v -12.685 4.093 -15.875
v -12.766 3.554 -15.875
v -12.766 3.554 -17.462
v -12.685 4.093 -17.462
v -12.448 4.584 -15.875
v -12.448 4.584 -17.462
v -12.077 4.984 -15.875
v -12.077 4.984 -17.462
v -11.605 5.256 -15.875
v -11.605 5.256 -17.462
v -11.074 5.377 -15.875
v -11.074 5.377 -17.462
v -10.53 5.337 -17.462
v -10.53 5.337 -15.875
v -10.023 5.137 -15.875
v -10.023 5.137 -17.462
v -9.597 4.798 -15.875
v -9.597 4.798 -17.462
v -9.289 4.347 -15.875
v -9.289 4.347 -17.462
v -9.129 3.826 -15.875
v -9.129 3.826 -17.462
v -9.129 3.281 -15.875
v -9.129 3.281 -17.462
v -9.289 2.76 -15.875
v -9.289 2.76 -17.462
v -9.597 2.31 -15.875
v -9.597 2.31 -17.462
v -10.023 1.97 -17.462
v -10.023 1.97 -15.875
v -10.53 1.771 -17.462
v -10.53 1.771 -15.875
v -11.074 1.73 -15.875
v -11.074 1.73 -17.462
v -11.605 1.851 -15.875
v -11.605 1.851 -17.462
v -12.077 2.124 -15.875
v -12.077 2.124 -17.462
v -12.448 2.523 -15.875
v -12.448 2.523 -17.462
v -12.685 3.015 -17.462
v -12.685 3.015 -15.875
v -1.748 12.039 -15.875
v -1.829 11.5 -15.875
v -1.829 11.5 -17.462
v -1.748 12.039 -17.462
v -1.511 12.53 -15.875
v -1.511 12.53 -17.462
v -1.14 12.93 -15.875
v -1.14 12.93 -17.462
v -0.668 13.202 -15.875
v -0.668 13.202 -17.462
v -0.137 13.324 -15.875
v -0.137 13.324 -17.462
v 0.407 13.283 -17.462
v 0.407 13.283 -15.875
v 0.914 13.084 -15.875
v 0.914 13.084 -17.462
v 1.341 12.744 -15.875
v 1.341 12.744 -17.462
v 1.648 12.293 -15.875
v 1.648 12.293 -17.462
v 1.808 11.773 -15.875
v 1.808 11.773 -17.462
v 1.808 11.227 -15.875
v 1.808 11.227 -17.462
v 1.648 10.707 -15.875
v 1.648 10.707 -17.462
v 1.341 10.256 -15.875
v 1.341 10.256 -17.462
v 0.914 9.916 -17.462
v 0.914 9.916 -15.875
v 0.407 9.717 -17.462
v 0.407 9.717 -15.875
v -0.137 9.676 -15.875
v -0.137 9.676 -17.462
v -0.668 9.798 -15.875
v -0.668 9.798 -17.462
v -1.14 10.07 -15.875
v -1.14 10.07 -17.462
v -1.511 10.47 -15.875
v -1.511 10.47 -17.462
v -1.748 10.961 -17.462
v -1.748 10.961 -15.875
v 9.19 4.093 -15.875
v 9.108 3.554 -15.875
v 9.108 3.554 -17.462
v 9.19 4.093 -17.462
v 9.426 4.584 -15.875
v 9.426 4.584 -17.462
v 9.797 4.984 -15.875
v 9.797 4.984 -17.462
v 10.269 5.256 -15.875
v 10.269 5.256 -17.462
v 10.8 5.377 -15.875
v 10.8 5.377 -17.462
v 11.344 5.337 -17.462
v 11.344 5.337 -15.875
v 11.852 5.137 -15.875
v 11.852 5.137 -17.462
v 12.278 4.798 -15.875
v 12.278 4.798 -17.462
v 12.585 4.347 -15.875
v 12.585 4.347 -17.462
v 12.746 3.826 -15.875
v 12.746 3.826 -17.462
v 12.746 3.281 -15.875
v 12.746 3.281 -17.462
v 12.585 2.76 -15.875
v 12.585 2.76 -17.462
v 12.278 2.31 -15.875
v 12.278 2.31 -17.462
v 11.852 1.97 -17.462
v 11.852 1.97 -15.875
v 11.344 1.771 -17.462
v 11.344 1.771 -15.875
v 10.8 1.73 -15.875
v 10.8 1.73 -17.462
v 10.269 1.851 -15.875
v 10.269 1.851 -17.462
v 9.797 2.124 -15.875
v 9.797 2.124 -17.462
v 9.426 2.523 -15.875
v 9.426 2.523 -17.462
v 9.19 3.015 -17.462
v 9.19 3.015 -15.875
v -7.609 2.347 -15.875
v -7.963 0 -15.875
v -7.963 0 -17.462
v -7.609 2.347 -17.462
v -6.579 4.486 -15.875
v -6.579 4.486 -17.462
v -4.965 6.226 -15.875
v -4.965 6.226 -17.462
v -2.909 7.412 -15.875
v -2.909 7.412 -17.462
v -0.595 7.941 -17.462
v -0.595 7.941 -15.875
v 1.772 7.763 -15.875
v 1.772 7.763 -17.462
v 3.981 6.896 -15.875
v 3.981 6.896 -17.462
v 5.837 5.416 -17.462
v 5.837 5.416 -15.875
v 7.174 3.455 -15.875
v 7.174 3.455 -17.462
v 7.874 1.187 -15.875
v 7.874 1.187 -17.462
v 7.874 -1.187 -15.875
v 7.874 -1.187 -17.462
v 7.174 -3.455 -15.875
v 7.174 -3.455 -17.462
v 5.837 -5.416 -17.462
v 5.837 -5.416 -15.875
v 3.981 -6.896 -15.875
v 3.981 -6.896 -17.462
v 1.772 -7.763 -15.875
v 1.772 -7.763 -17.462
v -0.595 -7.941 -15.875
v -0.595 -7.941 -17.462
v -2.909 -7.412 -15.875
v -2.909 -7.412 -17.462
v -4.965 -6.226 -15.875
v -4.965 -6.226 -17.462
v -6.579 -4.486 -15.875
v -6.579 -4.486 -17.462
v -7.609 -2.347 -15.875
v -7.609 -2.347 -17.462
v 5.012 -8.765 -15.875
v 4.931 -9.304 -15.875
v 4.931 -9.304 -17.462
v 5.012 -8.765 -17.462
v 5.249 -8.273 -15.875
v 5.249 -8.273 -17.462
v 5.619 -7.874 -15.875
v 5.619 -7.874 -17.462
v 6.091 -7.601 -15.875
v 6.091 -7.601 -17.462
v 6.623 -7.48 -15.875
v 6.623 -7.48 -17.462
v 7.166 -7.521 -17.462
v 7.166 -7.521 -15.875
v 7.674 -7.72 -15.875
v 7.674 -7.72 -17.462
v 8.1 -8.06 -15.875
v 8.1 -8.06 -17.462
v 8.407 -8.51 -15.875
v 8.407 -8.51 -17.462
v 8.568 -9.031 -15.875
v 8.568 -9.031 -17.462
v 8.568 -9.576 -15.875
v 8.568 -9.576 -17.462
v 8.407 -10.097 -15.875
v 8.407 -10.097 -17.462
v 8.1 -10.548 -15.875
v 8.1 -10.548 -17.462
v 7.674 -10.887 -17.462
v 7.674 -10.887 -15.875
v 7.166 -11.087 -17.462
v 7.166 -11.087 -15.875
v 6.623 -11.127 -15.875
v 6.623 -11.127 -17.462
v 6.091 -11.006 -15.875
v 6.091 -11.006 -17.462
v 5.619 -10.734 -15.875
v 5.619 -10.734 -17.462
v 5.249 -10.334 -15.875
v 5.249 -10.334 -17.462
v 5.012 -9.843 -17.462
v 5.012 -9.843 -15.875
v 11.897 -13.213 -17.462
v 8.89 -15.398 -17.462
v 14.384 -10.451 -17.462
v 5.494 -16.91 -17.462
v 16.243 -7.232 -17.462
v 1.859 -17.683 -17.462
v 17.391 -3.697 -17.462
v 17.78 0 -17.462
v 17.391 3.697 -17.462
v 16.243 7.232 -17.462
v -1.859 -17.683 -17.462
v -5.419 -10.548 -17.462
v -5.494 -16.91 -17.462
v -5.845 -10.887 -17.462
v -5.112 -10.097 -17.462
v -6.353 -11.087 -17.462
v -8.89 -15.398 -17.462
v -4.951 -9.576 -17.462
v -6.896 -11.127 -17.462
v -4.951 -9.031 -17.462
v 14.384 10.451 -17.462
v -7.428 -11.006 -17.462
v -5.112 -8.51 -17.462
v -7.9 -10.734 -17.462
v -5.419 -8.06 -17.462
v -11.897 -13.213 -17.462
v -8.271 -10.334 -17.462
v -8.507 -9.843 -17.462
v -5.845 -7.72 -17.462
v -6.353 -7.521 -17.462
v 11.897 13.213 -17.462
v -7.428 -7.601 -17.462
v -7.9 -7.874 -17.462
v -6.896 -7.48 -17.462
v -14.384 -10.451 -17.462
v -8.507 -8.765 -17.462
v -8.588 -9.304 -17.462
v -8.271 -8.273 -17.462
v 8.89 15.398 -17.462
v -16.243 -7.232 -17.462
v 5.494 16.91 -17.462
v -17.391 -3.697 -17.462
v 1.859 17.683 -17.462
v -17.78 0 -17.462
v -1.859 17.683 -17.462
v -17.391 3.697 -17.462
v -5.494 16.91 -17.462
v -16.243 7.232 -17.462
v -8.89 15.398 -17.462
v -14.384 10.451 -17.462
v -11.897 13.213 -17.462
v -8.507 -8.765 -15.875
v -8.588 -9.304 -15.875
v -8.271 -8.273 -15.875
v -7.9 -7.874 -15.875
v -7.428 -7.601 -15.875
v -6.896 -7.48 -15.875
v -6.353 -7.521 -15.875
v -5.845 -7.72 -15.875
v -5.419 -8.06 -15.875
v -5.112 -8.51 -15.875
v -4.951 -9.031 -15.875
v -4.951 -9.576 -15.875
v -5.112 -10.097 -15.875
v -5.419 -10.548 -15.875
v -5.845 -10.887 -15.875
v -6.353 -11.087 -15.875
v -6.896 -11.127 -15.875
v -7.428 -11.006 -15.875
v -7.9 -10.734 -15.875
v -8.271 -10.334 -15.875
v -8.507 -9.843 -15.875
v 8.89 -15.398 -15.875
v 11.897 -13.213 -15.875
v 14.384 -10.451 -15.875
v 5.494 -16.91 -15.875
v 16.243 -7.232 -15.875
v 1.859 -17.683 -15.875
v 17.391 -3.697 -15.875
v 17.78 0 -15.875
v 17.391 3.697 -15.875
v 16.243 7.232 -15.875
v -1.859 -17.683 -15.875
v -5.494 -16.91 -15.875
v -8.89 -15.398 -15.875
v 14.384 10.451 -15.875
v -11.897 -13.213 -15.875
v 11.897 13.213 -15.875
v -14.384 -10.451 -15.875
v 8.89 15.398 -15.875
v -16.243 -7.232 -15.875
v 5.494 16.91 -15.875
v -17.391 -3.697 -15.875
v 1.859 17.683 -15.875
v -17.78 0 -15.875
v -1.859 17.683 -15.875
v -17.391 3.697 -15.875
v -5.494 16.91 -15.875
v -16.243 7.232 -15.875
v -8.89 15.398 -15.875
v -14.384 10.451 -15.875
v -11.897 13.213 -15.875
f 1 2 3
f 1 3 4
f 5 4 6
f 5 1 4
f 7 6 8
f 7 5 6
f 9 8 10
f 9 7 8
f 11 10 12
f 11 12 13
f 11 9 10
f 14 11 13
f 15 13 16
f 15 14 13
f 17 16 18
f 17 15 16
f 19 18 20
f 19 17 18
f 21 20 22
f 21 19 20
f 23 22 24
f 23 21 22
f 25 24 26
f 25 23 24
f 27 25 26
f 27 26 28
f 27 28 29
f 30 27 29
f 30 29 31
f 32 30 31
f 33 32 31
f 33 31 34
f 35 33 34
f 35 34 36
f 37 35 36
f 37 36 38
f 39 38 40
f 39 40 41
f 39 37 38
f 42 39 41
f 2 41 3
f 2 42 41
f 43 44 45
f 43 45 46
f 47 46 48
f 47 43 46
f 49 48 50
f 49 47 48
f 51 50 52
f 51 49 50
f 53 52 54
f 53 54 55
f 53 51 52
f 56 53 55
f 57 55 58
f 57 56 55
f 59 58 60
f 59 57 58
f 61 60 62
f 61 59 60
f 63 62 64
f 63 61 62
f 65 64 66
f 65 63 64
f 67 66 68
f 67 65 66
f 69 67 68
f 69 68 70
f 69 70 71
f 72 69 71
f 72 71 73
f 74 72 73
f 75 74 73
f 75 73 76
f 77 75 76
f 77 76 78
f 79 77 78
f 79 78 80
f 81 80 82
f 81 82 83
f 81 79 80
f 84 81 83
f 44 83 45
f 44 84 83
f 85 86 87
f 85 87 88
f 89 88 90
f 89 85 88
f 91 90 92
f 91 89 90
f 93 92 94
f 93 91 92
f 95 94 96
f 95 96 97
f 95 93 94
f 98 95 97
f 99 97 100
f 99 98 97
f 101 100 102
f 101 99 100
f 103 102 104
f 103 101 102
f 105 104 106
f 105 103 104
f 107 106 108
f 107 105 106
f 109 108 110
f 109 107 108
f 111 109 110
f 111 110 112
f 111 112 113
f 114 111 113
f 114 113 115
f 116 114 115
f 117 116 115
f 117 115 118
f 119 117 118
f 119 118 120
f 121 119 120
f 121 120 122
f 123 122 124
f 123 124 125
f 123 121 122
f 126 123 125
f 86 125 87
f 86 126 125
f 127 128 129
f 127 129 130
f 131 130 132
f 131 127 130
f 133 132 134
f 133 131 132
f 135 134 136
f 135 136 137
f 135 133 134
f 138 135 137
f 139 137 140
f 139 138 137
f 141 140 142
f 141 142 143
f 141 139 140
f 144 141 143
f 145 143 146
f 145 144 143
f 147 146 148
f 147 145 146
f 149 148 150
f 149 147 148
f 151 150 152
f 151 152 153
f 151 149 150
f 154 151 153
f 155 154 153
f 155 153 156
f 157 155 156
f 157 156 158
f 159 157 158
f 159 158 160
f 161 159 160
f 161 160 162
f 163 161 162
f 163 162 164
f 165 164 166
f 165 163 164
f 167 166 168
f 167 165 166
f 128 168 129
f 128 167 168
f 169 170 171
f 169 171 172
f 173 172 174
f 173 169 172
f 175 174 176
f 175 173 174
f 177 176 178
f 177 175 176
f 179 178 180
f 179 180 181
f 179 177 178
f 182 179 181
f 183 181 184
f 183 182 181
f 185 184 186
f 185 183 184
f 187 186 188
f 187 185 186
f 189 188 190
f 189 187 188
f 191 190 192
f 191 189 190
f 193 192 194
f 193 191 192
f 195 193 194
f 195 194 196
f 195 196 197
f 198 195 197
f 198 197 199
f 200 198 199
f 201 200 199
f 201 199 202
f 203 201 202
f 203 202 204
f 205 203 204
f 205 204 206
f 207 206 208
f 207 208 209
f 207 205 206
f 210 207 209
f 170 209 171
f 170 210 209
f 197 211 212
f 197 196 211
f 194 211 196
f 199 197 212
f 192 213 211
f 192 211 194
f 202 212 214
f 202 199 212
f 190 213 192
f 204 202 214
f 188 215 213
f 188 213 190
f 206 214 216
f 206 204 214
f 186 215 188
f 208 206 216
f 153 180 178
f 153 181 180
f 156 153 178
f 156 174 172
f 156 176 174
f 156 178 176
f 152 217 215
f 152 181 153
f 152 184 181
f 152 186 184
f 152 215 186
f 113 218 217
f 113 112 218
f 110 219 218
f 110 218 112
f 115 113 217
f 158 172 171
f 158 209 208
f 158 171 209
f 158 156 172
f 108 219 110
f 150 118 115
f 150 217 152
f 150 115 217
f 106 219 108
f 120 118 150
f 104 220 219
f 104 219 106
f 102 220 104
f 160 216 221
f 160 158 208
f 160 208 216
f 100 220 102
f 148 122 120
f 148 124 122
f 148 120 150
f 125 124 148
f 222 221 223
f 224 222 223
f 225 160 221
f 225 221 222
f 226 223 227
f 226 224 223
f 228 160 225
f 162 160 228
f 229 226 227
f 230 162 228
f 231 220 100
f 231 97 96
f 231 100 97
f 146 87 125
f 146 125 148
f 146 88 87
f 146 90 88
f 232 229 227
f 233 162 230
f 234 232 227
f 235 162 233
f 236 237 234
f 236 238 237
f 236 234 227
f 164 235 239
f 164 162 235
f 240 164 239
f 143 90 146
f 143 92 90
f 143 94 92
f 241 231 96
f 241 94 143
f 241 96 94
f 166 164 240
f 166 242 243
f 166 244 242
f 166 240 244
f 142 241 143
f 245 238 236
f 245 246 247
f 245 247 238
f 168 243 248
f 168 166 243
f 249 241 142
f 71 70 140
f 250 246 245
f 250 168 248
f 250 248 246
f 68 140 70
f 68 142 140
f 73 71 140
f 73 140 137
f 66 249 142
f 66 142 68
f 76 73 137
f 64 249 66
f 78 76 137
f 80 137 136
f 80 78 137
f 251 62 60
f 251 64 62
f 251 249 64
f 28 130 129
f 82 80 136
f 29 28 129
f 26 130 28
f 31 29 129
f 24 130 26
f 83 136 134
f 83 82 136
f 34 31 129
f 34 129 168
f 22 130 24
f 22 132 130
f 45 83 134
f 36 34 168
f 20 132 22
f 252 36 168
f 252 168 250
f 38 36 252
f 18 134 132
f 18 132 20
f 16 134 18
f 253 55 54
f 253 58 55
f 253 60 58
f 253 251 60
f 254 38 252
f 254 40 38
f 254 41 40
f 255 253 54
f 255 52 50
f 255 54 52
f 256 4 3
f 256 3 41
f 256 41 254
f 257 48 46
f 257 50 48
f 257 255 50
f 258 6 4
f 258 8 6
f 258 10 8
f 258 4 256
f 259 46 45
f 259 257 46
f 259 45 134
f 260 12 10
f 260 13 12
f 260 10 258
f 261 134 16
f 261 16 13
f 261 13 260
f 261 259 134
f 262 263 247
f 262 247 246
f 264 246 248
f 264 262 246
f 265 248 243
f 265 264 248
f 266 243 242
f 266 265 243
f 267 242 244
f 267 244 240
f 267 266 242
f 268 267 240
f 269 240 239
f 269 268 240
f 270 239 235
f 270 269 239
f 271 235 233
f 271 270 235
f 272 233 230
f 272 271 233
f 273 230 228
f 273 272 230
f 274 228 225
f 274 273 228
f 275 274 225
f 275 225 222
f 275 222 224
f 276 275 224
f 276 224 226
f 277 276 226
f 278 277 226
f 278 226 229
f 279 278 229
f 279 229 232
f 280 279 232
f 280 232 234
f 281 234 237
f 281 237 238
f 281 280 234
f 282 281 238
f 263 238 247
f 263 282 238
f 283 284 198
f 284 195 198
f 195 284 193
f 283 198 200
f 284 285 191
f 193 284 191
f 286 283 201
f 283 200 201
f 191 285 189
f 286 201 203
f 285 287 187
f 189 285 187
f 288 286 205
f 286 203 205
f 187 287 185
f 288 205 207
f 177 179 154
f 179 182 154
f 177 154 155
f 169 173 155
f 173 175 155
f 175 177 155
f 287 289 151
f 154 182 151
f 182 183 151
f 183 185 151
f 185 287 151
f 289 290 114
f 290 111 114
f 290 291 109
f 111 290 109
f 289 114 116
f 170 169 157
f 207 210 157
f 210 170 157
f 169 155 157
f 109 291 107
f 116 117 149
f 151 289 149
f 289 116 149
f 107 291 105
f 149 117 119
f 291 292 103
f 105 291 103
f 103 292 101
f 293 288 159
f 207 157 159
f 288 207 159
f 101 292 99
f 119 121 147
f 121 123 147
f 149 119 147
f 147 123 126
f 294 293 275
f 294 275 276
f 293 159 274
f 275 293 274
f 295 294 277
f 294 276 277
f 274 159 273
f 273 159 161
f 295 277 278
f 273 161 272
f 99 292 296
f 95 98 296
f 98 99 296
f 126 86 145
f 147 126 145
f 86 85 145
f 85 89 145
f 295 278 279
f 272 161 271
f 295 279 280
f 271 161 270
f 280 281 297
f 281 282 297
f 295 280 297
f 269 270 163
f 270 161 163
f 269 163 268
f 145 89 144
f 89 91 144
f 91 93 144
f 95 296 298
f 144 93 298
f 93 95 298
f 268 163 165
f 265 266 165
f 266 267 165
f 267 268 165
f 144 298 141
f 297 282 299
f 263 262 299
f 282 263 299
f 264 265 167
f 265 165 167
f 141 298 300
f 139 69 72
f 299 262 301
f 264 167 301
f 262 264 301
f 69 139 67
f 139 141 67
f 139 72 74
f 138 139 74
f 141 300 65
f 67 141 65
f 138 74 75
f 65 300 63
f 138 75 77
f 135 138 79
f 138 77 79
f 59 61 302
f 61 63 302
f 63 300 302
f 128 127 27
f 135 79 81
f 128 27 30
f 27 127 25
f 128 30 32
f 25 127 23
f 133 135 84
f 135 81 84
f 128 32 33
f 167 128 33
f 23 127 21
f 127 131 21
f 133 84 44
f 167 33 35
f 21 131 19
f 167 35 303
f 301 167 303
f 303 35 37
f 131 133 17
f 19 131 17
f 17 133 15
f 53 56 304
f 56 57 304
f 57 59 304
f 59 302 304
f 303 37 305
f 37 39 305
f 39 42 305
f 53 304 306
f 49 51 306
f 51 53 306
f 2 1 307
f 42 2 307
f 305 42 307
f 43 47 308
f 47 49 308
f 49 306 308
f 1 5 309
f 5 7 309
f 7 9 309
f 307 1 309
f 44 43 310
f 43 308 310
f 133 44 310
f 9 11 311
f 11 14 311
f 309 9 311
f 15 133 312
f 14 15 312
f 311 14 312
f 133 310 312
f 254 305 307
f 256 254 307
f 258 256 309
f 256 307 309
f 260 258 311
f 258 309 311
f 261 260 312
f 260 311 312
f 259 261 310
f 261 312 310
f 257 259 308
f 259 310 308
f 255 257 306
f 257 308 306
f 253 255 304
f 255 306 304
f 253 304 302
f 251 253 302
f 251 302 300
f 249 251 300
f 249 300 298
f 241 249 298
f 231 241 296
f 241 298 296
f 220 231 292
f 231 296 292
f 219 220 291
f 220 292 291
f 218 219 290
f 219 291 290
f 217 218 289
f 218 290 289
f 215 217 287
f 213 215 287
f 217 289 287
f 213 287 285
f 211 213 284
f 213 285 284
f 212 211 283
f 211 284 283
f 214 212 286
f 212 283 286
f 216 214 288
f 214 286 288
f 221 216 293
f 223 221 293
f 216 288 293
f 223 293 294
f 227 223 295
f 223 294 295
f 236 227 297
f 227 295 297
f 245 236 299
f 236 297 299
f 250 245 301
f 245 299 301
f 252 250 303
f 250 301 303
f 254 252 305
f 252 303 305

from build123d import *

# Parameters (mm, degrees)
SKETCH3_R           = 17.78
SKETCH3_R_2         = 7.9629
SKETCH3_R_3         = 1.8288
BOSS_EXTRUDE2_DEPTH = 1.5875


with BuildPart() as part:
    # Sketch3 → Boss-Extrude2 (new body)
    with BuildSketch(Plane(origin=(0, 0, -15.875), x_dir=(-1, 0, 0), z_dir=(0, 0, -1))):
        Circle(SKETCH3_R)
        Circle(SKETCH3_R_2, mode=Mode.SUBTRACT)
        with Locations((-6.759530401, -9.303695435)):
            Circle(SKETCH3_R_3, mode=Mode.SUBTRACT)
        with Locations((6.759530401, -9.303695435)):
            Circle(SKETCH3_R_3, mode=Mode.SUBTRACT)
        with Locations((10.937149937, 3.553695435)):
            Circle(SKETCH3_R_3, mode=Mode.SUBTRACT)
        with Locations((0, 11.5)):
            Circle(SKETCH3_R_3, mode=Mode.SUBTRACT)
        with Locations((-10.937149937, 3.553695435)):
            Circle(SKETCH3_R_3, mode=Mode.SUBTRACT)
    extrude(amount=BOSS_EXTRUDE2_DEPTH)


solid = part.part
